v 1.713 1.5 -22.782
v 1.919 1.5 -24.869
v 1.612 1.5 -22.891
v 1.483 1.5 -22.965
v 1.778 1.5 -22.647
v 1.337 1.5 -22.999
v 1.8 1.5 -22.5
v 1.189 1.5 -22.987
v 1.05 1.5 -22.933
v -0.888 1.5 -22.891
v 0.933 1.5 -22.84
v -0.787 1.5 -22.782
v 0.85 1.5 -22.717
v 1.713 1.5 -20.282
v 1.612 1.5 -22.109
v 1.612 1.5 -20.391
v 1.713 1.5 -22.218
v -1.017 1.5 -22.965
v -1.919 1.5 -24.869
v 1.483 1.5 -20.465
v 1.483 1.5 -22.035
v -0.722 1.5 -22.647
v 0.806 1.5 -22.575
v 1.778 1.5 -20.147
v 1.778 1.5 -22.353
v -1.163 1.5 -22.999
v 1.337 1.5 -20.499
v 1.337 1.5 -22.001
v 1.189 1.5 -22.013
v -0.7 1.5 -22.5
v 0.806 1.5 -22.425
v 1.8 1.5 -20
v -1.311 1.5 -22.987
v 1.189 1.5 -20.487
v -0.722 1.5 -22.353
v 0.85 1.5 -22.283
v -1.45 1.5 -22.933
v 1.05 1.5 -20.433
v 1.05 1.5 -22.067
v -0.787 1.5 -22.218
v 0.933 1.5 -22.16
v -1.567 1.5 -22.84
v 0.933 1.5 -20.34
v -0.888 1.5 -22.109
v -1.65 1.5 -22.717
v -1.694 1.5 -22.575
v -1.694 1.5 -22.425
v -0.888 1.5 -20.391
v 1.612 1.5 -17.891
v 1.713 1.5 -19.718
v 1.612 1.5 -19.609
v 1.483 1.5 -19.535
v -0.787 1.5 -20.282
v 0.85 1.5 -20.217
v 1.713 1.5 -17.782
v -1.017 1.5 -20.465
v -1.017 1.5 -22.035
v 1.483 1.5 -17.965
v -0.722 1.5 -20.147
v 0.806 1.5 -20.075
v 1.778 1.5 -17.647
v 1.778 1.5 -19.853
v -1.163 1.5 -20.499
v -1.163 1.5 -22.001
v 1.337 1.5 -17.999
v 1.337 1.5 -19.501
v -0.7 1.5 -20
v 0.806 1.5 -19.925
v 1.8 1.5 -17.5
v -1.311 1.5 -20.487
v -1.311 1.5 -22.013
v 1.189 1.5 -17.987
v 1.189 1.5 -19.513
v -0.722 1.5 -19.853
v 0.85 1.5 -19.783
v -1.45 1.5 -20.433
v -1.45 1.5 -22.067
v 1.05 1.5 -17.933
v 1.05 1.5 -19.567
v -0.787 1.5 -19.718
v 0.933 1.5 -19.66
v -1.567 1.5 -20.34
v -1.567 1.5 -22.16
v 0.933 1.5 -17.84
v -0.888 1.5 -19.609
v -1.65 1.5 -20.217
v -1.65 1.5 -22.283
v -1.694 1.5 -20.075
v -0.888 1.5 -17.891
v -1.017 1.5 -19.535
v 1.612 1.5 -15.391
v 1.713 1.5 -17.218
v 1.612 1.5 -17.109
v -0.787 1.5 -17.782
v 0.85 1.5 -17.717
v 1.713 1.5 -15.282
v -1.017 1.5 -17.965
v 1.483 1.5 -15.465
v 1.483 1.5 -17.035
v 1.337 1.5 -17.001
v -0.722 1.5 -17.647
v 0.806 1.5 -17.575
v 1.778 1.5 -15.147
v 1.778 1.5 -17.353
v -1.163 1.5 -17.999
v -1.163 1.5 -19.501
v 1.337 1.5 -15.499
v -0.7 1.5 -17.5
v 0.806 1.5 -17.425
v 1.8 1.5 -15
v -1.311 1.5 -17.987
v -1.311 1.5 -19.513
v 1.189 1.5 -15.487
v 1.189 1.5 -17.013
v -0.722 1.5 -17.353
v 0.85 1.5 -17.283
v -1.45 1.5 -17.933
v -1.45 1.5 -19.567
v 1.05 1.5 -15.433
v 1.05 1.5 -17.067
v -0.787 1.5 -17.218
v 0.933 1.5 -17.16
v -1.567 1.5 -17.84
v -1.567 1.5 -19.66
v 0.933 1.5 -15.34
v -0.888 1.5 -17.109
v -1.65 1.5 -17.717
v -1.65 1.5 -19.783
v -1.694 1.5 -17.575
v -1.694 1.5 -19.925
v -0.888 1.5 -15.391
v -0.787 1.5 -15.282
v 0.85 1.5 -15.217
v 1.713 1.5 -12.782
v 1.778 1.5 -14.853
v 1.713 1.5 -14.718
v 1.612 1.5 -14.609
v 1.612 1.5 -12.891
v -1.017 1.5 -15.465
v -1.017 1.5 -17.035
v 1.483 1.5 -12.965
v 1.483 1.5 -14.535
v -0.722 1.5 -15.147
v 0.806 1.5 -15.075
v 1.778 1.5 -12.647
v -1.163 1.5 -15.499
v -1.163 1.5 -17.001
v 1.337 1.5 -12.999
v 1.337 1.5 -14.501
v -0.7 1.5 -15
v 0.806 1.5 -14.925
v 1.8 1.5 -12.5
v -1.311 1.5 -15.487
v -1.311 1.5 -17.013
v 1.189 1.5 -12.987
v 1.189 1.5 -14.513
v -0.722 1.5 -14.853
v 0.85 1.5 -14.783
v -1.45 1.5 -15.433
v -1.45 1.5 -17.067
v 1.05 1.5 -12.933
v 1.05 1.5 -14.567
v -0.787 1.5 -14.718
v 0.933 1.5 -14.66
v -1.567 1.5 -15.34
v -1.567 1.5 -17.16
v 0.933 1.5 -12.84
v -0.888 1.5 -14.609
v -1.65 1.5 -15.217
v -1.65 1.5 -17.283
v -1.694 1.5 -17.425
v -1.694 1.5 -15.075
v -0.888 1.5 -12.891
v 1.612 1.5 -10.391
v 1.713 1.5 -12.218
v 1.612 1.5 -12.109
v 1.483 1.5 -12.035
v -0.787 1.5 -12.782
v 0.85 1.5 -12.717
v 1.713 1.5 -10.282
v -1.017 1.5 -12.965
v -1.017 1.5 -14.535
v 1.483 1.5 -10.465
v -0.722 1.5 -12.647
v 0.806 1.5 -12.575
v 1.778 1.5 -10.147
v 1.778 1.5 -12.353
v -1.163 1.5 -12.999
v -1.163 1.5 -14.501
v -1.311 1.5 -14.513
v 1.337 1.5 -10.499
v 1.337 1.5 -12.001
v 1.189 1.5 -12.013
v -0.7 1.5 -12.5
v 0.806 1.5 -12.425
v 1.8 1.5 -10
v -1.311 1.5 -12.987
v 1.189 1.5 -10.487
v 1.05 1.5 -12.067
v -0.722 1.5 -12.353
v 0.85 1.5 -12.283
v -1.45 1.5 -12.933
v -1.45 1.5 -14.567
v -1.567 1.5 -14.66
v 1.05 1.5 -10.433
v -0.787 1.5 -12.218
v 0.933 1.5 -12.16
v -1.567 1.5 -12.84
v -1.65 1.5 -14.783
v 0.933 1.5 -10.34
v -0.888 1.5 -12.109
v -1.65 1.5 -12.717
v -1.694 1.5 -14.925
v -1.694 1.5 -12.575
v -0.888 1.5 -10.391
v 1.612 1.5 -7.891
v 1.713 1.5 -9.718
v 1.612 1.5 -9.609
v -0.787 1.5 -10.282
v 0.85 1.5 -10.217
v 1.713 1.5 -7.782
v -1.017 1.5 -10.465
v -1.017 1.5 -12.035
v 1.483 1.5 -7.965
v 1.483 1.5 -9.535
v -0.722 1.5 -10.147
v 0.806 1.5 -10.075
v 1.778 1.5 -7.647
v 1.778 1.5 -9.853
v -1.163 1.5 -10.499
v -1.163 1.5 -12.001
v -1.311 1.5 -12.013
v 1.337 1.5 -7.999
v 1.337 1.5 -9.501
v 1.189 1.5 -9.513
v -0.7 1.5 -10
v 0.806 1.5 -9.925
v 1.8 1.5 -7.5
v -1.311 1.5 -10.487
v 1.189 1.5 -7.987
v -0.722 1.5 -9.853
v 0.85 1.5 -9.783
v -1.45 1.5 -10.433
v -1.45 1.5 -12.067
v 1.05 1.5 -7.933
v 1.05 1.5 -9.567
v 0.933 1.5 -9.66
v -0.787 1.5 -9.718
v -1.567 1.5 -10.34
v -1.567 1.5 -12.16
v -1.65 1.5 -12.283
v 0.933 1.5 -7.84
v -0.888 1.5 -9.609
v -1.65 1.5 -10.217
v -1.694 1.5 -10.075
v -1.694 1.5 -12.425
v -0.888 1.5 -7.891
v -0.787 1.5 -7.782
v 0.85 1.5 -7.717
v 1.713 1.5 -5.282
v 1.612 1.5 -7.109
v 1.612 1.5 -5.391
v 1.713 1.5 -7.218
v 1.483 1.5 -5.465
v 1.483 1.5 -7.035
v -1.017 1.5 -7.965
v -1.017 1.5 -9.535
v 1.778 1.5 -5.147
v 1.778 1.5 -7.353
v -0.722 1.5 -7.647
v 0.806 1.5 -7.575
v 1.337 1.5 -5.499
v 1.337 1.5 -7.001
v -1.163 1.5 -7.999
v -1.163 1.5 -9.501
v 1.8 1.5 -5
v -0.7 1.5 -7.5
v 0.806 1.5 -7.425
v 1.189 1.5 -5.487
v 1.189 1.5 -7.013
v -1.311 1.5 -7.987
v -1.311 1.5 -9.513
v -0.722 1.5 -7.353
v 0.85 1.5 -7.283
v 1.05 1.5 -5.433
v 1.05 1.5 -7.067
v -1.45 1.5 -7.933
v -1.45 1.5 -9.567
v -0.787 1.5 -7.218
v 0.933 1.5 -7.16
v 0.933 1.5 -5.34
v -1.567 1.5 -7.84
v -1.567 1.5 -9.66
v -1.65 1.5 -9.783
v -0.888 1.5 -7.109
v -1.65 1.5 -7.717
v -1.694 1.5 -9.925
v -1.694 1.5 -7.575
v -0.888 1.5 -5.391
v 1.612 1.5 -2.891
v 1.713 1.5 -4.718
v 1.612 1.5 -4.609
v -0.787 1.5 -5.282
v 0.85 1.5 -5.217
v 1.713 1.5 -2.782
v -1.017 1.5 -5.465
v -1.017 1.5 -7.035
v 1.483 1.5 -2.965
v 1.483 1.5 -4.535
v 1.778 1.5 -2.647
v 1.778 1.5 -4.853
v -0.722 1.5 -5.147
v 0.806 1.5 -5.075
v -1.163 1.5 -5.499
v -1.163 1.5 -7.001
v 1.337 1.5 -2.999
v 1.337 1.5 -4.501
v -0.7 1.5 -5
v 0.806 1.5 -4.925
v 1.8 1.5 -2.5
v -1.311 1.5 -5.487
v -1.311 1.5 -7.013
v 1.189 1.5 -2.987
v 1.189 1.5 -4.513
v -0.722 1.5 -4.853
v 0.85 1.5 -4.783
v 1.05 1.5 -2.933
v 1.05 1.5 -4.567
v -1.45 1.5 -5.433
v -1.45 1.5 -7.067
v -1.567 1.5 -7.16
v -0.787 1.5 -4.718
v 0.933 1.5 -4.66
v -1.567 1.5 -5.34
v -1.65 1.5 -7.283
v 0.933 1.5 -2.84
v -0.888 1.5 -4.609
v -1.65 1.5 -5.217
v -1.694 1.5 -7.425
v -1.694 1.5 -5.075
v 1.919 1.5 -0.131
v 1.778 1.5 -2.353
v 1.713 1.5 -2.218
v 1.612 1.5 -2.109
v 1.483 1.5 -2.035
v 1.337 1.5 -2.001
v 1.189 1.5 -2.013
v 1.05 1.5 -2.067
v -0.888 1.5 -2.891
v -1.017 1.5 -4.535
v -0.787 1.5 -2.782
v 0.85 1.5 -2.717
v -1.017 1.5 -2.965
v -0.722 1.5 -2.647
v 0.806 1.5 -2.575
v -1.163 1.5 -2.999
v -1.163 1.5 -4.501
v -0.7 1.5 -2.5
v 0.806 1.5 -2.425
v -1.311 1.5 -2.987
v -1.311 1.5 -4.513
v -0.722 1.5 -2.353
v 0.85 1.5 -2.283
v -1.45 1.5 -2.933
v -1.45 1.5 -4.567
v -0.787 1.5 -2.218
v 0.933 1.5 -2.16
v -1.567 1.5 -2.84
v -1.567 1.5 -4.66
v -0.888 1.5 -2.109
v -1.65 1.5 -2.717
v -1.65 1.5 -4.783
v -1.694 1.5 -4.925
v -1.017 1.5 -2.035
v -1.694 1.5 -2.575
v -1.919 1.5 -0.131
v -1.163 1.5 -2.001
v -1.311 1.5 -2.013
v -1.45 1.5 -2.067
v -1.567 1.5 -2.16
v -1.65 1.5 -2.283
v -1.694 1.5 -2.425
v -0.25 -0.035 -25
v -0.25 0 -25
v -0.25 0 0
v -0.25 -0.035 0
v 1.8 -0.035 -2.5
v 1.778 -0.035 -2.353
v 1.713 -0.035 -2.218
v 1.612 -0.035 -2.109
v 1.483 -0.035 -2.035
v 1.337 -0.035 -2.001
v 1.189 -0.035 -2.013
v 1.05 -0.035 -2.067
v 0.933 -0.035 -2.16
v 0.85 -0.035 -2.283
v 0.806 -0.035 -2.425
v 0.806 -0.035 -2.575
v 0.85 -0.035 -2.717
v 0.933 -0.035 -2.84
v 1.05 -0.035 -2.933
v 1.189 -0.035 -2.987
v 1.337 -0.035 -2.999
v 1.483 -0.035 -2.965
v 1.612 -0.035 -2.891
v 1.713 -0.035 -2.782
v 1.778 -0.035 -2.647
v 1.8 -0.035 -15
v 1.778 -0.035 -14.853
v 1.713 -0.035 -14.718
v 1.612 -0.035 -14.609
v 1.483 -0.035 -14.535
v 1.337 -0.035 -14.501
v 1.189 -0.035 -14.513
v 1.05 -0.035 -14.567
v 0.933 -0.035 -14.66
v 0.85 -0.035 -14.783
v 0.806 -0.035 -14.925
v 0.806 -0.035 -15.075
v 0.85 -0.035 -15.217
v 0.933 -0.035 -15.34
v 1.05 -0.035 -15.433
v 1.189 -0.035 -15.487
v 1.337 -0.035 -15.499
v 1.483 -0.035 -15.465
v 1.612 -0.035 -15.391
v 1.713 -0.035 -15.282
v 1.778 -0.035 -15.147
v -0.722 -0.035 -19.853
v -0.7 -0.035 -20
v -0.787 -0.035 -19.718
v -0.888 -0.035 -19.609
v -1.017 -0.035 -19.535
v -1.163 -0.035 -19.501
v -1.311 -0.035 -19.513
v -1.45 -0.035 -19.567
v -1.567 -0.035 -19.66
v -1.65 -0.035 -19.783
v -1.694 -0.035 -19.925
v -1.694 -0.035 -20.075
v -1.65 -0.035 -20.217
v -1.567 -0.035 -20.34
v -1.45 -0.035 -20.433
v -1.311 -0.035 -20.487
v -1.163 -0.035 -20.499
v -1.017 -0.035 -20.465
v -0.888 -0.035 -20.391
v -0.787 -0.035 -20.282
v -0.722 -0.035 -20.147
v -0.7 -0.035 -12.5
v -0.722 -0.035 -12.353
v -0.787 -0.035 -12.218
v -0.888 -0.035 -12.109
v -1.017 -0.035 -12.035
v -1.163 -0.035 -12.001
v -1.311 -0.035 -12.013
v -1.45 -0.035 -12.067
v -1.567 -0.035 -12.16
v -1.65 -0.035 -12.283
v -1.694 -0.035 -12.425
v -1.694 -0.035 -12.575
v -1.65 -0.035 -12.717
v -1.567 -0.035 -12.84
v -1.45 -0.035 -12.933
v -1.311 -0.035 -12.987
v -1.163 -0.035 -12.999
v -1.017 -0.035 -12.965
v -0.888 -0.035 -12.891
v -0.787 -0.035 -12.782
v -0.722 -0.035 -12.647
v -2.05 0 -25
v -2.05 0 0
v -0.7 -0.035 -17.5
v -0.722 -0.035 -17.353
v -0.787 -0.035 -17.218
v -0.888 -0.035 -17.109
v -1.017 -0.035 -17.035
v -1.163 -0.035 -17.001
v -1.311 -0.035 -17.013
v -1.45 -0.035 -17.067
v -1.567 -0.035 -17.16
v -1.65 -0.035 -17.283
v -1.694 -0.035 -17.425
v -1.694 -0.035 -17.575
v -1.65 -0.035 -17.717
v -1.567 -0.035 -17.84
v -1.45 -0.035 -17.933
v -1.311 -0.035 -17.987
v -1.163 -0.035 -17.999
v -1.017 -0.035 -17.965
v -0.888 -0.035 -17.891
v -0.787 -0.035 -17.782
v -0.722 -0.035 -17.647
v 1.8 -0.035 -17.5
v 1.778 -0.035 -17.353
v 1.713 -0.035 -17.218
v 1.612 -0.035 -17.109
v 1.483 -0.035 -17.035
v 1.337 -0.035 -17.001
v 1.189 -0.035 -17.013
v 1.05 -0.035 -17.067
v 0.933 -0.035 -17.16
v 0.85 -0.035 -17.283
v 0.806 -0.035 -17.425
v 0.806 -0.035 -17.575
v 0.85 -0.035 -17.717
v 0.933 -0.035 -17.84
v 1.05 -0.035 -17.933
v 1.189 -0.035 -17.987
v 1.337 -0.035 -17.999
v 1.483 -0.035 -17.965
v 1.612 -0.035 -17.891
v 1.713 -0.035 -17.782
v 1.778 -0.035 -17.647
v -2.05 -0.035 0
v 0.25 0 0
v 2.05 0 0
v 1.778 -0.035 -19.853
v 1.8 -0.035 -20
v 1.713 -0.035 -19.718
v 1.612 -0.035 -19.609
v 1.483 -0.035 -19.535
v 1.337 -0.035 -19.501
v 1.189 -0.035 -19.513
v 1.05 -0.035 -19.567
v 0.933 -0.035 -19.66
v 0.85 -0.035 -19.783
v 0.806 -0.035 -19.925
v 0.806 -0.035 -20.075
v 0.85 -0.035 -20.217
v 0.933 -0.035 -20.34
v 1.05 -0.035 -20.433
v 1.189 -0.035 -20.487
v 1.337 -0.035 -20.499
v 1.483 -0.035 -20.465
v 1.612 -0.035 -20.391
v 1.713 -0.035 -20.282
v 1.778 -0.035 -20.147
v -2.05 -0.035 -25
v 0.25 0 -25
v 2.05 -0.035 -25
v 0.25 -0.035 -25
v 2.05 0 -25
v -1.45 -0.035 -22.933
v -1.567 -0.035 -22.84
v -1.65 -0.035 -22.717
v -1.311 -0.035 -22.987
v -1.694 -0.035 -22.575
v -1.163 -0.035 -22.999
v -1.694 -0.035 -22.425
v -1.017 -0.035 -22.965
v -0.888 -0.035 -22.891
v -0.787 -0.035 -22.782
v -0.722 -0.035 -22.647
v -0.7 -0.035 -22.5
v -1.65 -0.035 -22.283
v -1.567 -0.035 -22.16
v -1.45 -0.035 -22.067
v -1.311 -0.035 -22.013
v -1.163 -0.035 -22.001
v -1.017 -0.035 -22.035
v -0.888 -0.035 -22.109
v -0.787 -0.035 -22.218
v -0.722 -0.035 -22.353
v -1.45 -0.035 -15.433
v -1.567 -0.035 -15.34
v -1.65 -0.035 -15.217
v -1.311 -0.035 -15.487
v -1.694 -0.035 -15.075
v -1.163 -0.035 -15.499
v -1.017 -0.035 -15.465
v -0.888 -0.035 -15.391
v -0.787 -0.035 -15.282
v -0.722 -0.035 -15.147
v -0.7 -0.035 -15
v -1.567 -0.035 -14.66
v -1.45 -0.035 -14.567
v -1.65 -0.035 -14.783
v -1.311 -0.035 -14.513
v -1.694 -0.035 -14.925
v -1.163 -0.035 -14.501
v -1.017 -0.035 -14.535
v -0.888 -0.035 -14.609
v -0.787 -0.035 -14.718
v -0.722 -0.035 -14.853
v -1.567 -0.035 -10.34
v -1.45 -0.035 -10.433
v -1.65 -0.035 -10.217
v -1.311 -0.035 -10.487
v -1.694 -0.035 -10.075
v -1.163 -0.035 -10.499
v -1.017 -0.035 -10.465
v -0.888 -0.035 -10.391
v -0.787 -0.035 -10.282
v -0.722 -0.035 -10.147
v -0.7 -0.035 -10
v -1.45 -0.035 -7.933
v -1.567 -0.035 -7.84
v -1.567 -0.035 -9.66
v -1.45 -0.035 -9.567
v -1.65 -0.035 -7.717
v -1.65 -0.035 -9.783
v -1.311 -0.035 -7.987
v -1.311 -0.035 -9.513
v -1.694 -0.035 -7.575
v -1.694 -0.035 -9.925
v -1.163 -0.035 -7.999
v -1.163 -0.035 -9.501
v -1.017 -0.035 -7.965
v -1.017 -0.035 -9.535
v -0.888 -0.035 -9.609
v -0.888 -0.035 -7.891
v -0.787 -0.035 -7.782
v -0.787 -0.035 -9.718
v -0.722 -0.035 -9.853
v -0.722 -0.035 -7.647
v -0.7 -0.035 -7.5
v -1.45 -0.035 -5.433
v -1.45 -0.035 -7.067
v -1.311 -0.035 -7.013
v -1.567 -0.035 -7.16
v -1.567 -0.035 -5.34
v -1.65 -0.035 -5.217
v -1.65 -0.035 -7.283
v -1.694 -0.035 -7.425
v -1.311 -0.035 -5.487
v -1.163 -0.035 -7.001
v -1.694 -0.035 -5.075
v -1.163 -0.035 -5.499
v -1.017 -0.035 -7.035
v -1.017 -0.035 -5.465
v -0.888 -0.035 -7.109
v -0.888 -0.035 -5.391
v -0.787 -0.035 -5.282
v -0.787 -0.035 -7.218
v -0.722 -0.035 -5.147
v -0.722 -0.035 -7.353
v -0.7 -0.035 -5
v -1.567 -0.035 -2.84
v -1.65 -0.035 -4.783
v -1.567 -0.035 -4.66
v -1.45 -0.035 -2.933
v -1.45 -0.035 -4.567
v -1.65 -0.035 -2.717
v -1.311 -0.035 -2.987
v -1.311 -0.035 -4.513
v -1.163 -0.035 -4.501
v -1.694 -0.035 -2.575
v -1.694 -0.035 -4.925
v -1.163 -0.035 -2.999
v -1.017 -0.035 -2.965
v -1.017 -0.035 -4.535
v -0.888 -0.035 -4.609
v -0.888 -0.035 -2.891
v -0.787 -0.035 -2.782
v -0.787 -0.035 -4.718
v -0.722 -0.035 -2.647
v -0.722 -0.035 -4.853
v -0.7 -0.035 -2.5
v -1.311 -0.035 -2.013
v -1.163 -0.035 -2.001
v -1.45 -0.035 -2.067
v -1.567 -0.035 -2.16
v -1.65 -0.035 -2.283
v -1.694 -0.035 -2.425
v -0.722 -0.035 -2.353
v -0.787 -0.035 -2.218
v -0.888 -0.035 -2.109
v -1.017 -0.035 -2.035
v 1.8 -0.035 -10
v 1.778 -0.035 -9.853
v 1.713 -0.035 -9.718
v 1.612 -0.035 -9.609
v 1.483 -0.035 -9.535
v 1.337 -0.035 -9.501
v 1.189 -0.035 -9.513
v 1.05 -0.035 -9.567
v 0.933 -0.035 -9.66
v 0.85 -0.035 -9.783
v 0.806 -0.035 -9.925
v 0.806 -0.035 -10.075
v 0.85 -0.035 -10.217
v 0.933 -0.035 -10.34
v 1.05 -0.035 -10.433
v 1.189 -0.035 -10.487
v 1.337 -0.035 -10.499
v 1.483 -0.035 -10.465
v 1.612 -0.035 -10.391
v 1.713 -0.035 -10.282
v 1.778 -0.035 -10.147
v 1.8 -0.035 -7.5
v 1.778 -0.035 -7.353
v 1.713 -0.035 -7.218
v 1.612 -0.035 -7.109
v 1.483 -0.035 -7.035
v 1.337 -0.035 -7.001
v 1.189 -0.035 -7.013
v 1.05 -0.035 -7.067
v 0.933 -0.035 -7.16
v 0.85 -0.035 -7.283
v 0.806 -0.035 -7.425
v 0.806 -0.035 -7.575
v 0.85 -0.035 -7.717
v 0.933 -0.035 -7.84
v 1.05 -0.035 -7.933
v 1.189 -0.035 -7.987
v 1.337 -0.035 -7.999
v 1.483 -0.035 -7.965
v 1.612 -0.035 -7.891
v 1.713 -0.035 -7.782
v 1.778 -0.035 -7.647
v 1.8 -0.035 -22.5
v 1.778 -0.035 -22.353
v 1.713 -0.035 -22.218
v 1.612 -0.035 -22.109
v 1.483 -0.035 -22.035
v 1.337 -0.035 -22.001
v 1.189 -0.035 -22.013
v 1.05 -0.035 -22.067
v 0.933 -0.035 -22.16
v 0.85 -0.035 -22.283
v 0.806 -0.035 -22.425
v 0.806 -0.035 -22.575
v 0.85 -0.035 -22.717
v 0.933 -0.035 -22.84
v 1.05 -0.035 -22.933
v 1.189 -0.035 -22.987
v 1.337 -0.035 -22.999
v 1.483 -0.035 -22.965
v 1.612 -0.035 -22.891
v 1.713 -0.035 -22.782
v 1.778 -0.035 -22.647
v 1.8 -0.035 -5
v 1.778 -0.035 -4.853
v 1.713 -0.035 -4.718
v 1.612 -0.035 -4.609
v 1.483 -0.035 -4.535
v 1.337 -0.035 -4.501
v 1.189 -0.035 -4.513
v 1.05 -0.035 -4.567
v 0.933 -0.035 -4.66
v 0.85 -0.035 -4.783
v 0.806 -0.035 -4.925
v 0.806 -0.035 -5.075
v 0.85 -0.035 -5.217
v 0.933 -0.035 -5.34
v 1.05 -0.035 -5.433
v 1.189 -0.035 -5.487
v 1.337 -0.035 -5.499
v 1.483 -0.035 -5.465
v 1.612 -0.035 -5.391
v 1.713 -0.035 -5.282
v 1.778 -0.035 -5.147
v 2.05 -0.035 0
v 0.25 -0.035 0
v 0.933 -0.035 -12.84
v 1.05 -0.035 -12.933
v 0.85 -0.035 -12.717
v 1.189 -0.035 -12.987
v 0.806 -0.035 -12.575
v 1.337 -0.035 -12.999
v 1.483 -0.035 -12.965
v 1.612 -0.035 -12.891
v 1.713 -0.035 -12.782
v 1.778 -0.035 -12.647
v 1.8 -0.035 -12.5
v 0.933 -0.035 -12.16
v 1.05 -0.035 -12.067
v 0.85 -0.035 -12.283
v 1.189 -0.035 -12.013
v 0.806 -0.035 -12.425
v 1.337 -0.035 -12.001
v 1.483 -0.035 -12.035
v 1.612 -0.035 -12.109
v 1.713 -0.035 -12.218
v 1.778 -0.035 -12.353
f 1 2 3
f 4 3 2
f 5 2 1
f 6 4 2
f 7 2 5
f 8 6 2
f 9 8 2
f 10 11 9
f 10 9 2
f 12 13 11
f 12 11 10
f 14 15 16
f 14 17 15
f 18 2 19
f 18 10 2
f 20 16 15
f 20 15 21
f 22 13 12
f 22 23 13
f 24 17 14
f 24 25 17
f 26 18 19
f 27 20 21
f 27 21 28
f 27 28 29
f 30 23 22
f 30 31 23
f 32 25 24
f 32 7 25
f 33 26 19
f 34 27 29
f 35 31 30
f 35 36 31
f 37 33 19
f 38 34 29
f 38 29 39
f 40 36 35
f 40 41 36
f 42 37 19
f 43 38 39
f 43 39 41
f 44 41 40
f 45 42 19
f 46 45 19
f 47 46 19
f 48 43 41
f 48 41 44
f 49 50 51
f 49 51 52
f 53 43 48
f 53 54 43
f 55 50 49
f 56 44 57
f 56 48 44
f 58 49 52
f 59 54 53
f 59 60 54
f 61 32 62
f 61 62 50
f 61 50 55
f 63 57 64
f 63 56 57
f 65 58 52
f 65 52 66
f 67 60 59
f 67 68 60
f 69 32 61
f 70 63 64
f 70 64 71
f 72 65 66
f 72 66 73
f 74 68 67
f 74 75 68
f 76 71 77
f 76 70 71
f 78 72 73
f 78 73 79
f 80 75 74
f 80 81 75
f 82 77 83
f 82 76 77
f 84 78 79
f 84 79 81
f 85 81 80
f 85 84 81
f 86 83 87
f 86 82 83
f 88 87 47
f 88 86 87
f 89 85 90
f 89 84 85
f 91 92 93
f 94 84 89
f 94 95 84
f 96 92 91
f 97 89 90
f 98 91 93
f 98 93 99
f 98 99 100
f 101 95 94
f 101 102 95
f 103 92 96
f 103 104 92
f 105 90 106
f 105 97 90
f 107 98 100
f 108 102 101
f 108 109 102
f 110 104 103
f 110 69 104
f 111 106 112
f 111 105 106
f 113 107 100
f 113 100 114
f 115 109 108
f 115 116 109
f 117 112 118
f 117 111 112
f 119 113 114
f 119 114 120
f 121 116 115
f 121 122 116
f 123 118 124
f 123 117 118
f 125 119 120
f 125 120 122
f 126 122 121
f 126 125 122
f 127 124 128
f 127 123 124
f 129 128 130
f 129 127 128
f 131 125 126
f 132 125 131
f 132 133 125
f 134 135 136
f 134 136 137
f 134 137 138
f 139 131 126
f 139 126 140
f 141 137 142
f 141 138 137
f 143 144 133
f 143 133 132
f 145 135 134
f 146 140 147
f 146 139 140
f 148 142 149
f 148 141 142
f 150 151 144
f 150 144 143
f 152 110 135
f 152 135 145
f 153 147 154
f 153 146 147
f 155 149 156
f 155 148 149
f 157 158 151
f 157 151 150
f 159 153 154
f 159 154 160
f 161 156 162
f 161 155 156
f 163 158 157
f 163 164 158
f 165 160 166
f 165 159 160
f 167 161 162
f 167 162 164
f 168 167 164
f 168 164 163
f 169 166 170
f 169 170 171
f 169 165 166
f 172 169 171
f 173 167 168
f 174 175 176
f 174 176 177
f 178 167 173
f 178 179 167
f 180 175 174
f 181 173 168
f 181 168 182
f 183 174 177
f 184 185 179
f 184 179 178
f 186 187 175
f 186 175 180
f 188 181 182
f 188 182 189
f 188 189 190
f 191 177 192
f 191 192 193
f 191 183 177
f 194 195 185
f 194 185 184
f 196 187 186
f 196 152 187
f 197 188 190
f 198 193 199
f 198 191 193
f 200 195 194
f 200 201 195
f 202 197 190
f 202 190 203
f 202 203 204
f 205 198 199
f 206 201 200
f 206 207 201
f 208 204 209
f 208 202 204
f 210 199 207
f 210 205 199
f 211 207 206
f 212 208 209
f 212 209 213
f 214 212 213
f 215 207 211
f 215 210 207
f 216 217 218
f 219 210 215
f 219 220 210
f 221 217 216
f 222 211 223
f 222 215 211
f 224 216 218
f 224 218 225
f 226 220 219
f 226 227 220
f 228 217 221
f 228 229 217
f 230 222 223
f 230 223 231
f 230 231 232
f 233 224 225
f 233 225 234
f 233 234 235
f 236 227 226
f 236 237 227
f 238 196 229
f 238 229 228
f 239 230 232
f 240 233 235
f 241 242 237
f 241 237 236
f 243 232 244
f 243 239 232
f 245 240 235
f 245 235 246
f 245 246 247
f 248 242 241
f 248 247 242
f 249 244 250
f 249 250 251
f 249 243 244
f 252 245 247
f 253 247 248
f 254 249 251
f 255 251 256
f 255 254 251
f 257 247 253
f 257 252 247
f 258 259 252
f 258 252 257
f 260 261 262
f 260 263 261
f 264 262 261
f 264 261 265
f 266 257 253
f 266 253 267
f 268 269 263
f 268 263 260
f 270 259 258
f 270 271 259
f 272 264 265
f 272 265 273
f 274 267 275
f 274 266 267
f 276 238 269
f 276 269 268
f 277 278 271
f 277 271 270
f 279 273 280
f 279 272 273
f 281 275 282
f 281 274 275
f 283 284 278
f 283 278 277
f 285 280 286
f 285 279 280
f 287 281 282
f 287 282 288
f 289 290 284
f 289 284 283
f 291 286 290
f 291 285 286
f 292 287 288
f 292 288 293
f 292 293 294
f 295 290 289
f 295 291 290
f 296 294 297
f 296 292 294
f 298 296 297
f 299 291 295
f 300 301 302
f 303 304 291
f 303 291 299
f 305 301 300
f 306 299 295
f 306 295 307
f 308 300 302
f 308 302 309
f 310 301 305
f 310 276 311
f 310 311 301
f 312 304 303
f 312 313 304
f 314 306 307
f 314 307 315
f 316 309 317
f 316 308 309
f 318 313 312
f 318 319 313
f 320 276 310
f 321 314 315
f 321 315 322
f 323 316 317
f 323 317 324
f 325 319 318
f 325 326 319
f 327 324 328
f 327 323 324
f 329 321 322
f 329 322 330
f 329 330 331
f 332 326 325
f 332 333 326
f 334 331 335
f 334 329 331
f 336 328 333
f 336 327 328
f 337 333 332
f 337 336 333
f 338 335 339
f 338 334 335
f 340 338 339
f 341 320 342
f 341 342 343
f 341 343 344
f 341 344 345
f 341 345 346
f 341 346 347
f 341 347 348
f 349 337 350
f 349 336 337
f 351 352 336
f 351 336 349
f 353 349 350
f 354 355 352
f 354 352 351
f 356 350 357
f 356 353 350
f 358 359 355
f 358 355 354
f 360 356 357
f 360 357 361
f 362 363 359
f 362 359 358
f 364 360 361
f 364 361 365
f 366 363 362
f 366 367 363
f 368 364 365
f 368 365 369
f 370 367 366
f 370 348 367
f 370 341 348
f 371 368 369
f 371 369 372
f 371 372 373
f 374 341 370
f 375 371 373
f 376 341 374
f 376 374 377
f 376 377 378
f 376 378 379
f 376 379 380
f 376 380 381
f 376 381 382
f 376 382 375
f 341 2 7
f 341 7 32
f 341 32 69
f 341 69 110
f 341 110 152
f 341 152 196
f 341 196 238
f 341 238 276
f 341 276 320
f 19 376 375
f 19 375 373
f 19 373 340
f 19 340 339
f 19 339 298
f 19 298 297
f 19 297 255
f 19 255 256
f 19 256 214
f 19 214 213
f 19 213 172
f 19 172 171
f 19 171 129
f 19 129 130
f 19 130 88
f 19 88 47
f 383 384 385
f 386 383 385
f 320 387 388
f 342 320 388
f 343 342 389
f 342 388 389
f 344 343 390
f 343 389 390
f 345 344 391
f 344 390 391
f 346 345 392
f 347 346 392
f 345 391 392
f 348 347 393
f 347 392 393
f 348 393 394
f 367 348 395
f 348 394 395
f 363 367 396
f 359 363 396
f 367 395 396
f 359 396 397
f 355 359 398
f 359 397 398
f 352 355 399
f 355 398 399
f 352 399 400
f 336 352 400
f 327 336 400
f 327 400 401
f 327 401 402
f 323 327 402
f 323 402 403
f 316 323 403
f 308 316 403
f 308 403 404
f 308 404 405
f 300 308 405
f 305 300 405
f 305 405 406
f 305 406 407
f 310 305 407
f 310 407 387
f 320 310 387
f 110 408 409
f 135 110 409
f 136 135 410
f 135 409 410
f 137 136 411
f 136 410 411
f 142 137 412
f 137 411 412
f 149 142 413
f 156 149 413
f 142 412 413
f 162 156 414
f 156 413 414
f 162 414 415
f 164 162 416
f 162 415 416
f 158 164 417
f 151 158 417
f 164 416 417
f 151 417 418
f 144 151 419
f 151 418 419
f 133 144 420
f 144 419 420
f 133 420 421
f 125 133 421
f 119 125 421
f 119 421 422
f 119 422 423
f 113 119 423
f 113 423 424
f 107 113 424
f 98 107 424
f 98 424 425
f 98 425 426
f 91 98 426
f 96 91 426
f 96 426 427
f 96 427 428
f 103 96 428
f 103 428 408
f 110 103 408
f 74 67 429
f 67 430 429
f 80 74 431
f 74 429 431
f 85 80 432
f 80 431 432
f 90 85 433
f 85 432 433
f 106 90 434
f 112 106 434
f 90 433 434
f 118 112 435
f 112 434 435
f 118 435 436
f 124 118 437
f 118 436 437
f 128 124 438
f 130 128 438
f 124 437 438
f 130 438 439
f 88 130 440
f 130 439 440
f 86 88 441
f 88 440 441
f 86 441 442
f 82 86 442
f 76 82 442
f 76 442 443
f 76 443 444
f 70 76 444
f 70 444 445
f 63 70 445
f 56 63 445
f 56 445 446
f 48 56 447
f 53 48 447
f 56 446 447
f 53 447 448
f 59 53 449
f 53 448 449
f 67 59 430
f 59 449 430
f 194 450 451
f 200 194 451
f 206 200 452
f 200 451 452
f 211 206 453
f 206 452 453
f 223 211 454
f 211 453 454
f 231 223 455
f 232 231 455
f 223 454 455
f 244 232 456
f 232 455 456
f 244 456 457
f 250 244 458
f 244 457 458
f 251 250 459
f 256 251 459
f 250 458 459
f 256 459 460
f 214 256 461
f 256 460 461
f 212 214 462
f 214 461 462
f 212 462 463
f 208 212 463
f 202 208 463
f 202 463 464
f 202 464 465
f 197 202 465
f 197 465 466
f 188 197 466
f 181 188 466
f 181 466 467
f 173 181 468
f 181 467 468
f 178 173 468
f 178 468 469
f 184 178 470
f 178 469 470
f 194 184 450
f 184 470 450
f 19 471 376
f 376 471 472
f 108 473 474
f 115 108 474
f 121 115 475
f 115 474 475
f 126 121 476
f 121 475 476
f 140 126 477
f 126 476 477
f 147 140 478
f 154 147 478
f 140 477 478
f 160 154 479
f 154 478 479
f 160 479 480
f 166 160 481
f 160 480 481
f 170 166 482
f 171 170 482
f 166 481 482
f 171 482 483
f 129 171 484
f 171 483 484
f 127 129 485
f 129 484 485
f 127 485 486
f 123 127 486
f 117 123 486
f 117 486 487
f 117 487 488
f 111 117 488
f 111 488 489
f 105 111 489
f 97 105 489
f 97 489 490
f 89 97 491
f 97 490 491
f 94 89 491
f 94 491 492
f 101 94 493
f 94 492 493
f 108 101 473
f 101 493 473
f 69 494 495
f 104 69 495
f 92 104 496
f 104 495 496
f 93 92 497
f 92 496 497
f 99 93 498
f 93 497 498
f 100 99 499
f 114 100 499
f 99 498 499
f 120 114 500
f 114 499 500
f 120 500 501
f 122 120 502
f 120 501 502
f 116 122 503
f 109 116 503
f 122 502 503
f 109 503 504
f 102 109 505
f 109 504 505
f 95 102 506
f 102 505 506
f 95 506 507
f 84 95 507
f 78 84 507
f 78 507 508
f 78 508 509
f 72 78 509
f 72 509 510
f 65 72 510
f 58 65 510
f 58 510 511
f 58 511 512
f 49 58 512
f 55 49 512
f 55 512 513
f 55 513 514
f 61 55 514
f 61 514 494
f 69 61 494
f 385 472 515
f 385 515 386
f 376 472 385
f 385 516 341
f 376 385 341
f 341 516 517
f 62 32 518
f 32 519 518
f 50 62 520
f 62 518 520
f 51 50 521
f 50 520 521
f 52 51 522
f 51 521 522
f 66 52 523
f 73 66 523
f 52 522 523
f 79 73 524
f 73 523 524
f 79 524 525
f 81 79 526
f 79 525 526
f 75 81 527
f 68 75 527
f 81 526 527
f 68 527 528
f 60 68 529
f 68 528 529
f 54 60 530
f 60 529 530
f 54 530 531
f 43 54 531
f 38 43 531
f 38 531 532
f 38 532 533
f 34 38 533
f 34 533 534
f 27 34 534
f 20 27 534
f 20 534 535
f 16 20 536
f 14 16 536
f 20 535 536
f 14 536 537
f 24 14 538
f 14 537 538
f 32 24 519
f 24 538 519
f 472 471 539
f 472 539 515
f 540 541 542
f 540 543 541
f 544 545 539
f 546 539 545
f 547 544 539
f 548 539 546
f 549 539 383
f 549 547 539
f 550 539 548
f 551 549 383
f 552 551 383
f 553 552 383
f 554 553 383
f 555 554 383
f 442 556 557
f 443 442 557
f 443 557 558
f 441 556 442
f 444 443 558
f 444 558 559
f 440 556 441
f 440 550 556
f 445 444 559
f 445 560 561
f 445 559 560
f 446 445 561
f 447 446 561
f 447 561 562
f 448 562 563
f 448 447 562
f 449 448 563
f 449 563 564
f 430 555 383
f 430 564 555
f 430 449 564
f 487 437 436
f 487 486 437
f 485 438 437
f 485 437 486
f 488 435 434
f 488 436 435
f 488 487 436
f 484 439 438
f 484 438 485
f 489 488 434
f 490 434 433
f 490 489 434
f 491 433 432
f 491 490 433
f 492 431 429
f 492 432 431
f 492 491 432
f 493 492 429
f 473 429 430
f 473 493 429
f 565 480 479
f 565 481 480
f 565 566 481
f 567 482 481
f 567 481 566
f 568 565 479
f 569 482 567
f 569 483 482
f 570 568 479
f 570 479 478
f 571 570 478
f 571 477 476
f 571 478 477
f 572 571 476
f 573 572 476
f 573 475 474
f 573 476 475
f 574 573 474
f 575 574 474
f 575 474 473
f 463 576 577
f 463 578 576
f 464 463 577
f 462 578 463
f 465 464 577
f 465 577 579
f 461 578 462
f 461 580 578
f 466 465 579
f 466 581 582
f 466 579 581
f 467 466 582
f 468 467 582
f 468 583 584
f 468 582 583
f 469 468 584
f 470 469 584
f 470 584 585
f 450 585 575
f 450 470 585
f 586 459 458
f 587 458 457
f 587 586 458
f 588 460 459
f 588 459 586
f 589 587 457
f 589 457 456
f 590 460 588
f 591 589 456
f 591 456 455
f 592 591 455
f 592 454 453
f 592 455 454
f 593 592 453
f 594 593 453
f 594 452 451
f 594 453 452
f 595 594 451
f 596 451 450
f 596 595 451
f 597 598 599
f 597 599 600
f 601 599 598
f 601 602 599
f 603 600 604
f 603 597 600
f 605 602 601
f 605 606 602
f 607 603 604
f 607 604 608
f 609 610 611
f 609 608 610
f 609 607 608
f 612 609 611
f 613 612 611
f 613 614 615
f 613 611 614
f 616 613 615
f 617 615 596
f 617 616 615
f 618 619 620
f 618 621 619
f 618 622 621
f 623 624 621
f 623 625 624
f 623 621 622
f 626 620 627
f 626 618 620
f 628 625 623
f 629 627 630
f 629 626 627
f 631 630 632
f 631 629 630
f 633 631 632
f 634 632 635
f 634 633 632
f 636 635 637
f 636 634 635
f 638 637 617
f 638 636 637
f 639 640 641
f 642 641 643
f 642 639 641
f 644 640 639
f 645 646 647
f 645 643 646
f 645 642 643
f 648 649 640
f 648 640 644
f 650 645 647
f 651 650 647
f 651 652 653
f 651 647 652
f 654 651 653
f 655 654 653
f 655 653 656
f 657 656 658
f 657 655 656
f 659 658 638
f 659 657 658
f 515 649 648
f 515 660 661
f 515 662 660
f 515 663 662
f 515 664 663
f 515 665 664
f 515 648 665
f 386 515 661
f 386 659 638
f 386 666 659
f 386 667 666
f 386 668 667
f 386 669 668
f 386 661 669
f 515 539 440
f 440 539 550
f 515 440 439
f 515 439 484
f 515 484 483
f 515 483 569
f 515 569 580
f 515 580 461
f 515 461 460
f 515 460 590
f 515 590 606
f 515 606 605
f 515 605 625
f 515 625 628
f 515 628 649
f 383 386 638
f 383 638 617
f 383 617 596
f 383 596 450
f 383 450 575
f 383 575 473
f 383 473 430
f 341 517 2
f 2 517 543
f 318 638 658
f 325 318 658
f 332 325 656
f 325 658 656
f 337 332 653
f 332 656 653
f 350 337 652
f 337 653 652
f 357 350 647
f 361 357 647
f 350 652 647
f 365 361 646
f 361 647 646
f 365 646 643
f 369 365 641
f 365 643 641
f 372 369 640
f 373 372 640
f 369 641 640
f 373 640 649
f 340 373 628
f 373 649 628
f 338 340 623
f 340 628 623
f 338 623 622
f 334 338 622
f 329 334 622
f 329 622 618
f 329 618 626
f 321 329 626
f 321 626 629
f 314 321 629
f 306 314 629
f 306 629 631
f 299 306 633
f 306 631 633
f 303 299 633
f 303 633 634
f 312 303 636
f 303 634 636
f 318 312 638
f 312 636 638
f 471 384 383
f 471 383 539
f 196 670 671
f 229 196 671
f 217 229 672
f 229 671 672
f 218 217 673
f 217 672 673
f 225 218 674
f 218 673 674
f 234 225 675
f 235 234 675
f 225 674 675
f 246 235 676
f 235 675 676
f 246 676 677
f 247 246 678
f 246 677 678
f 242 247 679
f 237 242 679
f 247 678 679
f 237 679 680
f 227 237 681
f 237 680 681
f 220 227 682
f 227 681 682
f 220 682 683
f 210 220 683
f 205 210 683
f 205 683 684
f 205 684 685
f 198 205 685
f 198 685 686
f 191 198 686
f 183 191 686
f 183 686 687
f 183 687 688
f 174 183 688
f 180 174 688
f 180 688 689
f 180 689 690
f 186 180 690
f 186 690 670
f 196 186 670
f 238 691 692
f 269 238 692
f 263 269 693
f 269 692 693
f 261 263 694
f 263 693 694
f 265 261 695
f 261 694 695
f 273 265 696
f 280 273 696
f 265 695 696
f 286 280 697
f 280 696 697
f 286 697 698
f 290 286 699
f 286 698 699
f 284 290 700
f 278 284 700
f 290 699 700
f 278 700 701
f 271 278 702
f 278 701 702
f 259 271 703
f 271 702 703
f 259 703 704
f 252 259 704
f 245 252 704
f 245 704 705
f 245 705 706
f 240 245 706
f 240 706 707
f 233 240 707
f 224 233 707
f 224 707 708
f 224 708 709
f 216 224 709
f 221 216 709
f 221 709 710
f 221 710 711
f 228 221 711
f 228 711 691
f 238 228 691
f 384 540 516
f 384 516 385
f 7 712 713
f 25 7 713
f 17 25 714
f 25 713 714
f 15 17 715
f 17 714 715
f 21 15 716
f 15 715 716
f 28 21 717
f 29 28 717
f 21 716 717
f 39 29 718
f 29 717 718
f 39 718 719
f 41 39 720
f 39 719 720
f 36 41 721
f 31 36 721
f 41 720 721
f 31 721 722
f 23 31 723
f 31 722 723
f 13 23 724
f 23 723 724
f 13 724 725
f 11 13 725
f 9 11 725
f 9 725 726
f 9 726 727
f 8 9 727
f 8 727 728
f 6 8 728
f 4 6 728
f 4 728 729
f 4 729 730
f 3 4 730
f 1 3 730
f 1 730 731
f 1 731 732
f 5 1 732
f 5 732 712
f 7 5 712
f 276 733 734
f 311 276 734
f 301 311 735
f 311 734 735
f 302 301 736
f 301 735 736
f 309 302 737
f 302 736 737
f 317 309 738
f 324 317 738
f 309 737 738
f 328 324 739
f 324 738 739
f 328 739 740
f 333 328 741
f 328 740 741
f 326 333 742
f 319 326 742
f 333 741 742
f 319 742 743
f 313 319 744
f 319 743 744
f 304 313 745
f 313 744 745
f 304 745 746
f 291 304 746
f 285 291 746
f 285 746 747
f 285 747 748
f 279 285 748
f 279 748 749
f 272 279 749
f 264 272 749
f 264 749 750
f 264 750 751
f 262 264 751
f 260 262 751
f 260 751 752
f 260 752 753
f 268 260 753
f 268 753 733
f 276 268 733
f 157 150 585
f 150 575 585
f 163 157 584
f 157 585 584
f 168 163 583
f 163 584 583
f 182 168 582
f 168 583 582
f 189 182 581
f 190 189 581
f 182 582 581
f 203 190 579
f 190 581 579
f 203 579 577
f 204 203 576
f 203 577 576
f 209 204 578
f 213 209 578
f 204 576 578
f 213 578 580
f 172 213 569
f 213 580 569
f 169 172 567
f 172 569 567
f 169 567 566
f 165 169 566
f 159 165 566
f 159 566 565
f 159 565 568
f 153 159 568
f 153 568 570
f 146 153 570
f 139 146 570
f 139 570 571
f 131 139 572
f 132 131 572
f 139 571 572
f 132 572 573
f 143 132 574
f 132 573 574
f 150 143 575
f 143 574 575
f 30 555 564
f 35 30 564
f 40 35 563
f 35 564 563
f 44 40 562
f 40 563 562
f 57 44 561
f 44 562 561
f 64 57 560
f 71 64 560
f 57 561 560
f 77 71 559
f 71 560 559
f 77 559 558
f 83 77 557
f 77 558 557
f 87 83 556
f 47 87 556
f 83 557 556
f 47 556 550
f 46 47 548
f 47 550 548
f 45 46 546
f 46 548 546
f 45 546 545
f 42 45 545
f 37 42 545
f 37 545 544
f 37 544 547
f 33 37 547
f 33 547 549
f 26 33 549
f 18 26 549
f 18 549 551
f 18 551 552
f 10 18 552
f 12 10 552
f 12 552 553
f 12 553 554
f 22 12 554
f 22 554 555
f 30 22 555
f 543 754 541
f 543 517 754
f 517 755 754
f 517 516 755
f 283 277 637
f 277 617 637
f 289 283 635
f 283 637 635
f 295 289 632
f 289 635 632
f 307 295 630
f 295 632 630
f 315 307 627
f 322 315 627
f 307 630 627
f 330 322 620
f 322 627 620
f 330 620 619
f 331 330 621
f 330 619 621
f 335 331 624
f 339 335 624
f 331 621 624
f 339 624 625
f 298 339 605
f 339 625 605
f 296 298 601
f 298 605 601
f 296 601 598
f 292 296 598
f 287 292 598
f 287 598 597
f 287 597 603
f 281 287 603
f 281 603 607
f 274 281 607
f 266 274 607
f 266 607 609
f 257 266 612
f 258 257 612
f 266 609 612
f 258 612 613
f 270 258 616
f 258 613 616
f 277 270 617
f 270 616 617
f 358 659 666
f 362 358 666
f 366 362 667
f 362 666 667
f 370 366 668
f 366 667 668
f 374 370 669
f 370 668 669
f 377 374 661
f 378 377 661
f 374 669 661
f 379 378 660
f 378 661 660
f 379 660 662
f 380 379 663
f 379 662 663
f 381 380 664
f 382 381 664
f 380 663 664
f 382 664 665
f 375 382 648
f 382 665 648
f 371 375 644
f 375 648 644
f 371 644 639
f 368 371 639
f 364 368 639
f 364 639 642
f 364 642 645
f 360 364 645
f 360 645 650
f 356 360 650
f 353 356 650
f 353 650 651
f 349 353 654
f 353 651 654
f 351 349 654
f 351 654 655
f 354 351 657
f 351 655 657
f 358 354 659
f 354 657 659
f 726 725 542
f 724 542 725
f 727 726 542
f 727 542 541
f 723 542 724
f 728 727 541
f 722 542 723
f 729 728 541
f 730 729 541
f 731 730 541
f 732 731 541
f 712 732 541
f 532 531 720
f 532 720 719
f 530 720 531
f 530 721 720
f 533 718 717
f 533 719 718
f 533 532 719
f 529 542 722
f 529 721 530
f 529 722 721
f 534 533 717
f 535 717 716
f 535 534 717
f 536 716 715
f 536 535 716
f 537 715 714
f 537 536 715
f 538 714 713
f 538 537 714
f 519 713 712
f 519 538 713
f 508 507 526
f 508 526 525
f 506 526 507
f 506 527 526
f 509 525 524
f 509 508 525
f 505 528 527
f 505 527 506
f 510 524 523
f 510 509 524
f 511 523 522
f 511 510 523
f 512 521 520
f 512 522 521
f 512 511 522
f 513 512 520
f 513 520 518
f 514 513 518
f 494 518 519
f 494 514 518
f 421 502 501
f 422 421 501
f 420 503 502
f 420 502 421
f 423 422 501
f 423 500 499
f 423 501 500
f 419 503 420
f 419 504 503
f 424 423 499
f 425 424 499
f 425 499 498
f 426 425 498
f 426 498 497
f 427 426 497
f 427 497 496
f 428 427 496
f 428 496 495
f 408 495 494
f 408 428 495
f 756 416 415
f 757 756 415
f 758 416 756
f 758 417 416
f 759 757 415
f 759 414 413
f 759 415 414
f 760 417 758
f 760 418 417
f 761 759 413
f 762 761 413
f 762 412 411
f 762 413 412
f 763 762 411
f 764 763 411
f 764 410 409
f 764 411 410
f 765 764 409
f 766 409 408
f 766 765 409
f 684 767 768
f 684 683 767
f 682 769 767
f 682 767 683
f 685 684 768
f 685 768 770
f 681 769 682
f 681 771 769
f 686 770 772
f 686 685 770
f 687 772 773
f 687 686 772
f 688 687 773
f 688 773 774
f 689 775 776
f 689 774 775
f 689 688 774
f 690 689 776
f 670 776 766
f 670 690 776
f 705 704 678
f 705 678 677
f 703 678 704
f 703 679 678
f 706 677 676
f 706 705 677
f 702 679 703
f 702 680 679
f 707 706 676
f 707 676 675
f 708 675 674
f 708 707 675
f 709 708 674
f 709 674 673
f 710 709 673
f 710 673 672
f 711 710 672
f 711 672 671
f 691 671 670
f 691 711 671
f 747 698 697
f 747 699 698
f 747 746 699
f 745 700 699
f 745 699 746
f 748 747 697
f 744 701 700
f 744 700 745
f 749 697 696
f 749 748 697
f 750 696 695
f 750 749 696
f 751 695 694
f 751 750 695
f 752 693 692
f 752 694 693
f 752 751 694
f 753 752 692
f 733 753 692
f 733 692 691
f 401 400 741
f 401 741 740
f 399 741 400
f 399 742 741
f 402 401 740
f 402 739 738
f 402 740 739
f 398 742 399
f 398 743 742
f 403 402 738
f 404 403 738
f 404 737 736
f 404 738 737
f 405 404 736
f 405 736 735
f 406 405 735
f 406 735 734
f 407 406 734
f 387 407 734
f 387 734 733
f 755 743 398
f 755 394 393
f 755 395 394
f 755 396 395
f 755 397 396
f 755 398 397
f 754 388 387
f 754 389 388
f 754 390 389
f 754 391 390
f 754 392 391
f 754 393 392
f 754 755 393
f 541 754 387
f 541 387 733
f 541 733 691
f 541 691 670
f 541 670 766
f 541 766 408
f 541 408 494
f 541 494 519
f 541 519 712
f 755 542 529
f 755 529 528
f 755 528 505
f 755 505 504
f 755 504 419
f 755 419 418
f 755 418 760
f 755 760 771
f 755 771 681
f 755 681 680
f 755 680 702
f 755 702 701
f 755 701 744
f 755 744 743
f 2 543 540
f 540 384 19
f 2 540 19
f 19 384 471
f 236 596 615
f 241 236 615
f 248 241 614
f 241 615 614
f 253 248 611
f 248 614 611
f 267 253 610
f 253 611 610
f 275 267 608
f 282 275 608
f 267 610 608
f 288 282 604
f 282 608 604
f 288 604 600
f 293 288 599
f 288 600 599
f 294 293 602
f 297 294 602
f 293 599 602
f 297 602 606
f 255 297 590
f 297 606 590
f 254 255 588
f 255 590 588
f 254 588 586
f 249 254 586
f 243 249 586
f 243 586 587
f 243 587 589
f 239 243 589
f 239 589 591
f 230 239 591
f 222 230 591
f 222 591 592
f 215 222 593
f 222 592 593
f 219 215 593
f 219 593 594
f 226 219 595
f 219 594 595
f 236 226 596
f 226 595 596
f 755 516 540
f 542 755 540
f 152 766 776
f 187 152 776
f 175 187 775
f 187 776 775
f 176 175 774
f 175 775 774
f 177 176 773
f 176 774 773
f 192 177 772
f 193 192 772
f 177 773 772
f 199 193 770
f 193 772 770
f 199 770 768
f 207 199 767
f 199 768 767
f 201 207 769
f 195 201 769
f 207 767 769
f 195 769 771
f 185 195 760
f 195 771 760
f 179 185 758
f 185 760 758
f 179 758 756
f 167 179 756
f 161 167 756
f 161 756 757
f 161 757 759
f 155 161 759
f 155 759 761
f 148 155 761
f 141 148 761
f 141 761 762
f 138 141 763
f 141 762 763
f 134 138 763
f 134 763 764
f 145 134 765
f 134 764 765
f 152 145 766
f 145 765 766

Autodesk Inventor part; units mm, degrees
ref_plane "YZ Plane" through (0, 0, 0) normal (1, 0, 0) x (0, 1, 0)
ref_plane "XZ Plane" through (0, 0, 0) normal (0, 1, 0) x (-1, 0, 0)
ref_plane "XY Plane" through (0, 0, 0) normal (0, 0, 1) x (1, 0, 0)
sketch "Sketch1" plane through (0, 0, 0) normal (0, 0, 1) x (1, 0, 0)
  point P0 (0, 0)
sketch "Sketch2" plane through (0, 0, 0) normal (0, 1, 0) x (-1, 0, 0)
  line L0 (2.87, 0) -> (-2.87, 0) projected
  line L1 (0, -30) -> (0, 5) projected
  line L2 (2.05, 0) -> (-2.05, 0)
  line L3 (-2.05, 0) -> (-2.05, -25)
  line L4 (-2.05, -25) -> (2.05, -25)
  line L5 (2.05, -25) -> (2.05, 0)
  point P0 (0, 0)
  dimension "d0" = 4.1
  dimension "d1" = 25
sketch "Sketch2 outline for Extrusion1" plane through (0, 0, 0) normal (0, 1, 0) x (-1, 0, 0)
  line L0 (2.05, -25) -> (2.05, 0)
  line L1 (-2.05, -25) -> (2.05, -25)
  line L2 (-2.05, 0) -> (-2.05, -25)
  line L3 (2.05, 0) -> (-2.05, 0)
extrude "Extrusion1" add sketch "Sketch2 outline for Extrusion1" along normal blind 1.5 draft -5
sketch "Sketch3" plane through (0, 0, 0) normal (0, -1, 0) x (1, 0, 0)
  line L0 (-2.05, 0) -> (2.05, 0) projected
  line L1 (-2.05, -25) -> (-2.05, 0) projected
  line L2 (2.05, -25) -> (-2.05, -25) projected
  line L3 (2.05, 0) -> (2.05, -25) projected
  line L4 (-2.87, 0) -> (2.87, 0) projected
  line L5 (0, -30) -> (0, 5) projected
  line L6 (-2.05, 0) -> (2.05, 0) projected
  line L7 (2.05, 0) -> (0.25, 0)
  line L8 (0.25, 0) -> (0.25, -25)
  line L9 (0.25, -25) -> (2.05, -25)
  line L10 (2.05, -25) -> (2.05, 0)
  point P0 (0, 0)
  point P1 (0.25, 0)
  dimension "d4" = 1.8
extrude "Extrusion2" add sketch "Sketch3" along normal blind 0.035 contours L0 L3 L2 L8
mirror "Mirror1" about plane through (0, 0, 0) normal (1, 0, 0) of "Extrusion2"
sketch "Sketch4" plane through (0, -0.035, 0) normal (0, -1, 0) x (1, 0, 0)
  circle A0 centre (1.3, -2.5) radius 0.5
  line L0 (2.05, 0) -> (0.25, 0) projected
  line L1 (2.05, -25) -> (2.05, 0) projected
  point P0 (0, 0)
  dimension "d7" = 1
  dimension "d8" = 2.5
  dimension "d9" = 0.75
extrude "Extrusion3" cut sketch "Sketch4" against normal through all
pattern_linear "Rectangular Pattern1" count 9 spacing 2.5 along (0, 0, -1) count 2 spacing 2.5 along (-1, 0, 0) of "Extrusion3"
equation "\"BendRadius\" = Thickness"
equation "\"BendReliefWidth\" = Thickness"
equation "\"BendReliefDepth\" = 0.5 * Thickness"
equation "\"CornerReliefSize\" = 4 * Thickness"
equation "\"MinimumRemnant\" = 2 * Thickness"
equation "\"TransitionRadius\" = BendRadius"
equation "\"JacobiRadiusSize\" = BendRadius"
equation "\"GapSize\" = Thickness"
equation "\"Thickness\" = 3.048"
properties part number "VeroBoardLeadsSIngleHeater"
